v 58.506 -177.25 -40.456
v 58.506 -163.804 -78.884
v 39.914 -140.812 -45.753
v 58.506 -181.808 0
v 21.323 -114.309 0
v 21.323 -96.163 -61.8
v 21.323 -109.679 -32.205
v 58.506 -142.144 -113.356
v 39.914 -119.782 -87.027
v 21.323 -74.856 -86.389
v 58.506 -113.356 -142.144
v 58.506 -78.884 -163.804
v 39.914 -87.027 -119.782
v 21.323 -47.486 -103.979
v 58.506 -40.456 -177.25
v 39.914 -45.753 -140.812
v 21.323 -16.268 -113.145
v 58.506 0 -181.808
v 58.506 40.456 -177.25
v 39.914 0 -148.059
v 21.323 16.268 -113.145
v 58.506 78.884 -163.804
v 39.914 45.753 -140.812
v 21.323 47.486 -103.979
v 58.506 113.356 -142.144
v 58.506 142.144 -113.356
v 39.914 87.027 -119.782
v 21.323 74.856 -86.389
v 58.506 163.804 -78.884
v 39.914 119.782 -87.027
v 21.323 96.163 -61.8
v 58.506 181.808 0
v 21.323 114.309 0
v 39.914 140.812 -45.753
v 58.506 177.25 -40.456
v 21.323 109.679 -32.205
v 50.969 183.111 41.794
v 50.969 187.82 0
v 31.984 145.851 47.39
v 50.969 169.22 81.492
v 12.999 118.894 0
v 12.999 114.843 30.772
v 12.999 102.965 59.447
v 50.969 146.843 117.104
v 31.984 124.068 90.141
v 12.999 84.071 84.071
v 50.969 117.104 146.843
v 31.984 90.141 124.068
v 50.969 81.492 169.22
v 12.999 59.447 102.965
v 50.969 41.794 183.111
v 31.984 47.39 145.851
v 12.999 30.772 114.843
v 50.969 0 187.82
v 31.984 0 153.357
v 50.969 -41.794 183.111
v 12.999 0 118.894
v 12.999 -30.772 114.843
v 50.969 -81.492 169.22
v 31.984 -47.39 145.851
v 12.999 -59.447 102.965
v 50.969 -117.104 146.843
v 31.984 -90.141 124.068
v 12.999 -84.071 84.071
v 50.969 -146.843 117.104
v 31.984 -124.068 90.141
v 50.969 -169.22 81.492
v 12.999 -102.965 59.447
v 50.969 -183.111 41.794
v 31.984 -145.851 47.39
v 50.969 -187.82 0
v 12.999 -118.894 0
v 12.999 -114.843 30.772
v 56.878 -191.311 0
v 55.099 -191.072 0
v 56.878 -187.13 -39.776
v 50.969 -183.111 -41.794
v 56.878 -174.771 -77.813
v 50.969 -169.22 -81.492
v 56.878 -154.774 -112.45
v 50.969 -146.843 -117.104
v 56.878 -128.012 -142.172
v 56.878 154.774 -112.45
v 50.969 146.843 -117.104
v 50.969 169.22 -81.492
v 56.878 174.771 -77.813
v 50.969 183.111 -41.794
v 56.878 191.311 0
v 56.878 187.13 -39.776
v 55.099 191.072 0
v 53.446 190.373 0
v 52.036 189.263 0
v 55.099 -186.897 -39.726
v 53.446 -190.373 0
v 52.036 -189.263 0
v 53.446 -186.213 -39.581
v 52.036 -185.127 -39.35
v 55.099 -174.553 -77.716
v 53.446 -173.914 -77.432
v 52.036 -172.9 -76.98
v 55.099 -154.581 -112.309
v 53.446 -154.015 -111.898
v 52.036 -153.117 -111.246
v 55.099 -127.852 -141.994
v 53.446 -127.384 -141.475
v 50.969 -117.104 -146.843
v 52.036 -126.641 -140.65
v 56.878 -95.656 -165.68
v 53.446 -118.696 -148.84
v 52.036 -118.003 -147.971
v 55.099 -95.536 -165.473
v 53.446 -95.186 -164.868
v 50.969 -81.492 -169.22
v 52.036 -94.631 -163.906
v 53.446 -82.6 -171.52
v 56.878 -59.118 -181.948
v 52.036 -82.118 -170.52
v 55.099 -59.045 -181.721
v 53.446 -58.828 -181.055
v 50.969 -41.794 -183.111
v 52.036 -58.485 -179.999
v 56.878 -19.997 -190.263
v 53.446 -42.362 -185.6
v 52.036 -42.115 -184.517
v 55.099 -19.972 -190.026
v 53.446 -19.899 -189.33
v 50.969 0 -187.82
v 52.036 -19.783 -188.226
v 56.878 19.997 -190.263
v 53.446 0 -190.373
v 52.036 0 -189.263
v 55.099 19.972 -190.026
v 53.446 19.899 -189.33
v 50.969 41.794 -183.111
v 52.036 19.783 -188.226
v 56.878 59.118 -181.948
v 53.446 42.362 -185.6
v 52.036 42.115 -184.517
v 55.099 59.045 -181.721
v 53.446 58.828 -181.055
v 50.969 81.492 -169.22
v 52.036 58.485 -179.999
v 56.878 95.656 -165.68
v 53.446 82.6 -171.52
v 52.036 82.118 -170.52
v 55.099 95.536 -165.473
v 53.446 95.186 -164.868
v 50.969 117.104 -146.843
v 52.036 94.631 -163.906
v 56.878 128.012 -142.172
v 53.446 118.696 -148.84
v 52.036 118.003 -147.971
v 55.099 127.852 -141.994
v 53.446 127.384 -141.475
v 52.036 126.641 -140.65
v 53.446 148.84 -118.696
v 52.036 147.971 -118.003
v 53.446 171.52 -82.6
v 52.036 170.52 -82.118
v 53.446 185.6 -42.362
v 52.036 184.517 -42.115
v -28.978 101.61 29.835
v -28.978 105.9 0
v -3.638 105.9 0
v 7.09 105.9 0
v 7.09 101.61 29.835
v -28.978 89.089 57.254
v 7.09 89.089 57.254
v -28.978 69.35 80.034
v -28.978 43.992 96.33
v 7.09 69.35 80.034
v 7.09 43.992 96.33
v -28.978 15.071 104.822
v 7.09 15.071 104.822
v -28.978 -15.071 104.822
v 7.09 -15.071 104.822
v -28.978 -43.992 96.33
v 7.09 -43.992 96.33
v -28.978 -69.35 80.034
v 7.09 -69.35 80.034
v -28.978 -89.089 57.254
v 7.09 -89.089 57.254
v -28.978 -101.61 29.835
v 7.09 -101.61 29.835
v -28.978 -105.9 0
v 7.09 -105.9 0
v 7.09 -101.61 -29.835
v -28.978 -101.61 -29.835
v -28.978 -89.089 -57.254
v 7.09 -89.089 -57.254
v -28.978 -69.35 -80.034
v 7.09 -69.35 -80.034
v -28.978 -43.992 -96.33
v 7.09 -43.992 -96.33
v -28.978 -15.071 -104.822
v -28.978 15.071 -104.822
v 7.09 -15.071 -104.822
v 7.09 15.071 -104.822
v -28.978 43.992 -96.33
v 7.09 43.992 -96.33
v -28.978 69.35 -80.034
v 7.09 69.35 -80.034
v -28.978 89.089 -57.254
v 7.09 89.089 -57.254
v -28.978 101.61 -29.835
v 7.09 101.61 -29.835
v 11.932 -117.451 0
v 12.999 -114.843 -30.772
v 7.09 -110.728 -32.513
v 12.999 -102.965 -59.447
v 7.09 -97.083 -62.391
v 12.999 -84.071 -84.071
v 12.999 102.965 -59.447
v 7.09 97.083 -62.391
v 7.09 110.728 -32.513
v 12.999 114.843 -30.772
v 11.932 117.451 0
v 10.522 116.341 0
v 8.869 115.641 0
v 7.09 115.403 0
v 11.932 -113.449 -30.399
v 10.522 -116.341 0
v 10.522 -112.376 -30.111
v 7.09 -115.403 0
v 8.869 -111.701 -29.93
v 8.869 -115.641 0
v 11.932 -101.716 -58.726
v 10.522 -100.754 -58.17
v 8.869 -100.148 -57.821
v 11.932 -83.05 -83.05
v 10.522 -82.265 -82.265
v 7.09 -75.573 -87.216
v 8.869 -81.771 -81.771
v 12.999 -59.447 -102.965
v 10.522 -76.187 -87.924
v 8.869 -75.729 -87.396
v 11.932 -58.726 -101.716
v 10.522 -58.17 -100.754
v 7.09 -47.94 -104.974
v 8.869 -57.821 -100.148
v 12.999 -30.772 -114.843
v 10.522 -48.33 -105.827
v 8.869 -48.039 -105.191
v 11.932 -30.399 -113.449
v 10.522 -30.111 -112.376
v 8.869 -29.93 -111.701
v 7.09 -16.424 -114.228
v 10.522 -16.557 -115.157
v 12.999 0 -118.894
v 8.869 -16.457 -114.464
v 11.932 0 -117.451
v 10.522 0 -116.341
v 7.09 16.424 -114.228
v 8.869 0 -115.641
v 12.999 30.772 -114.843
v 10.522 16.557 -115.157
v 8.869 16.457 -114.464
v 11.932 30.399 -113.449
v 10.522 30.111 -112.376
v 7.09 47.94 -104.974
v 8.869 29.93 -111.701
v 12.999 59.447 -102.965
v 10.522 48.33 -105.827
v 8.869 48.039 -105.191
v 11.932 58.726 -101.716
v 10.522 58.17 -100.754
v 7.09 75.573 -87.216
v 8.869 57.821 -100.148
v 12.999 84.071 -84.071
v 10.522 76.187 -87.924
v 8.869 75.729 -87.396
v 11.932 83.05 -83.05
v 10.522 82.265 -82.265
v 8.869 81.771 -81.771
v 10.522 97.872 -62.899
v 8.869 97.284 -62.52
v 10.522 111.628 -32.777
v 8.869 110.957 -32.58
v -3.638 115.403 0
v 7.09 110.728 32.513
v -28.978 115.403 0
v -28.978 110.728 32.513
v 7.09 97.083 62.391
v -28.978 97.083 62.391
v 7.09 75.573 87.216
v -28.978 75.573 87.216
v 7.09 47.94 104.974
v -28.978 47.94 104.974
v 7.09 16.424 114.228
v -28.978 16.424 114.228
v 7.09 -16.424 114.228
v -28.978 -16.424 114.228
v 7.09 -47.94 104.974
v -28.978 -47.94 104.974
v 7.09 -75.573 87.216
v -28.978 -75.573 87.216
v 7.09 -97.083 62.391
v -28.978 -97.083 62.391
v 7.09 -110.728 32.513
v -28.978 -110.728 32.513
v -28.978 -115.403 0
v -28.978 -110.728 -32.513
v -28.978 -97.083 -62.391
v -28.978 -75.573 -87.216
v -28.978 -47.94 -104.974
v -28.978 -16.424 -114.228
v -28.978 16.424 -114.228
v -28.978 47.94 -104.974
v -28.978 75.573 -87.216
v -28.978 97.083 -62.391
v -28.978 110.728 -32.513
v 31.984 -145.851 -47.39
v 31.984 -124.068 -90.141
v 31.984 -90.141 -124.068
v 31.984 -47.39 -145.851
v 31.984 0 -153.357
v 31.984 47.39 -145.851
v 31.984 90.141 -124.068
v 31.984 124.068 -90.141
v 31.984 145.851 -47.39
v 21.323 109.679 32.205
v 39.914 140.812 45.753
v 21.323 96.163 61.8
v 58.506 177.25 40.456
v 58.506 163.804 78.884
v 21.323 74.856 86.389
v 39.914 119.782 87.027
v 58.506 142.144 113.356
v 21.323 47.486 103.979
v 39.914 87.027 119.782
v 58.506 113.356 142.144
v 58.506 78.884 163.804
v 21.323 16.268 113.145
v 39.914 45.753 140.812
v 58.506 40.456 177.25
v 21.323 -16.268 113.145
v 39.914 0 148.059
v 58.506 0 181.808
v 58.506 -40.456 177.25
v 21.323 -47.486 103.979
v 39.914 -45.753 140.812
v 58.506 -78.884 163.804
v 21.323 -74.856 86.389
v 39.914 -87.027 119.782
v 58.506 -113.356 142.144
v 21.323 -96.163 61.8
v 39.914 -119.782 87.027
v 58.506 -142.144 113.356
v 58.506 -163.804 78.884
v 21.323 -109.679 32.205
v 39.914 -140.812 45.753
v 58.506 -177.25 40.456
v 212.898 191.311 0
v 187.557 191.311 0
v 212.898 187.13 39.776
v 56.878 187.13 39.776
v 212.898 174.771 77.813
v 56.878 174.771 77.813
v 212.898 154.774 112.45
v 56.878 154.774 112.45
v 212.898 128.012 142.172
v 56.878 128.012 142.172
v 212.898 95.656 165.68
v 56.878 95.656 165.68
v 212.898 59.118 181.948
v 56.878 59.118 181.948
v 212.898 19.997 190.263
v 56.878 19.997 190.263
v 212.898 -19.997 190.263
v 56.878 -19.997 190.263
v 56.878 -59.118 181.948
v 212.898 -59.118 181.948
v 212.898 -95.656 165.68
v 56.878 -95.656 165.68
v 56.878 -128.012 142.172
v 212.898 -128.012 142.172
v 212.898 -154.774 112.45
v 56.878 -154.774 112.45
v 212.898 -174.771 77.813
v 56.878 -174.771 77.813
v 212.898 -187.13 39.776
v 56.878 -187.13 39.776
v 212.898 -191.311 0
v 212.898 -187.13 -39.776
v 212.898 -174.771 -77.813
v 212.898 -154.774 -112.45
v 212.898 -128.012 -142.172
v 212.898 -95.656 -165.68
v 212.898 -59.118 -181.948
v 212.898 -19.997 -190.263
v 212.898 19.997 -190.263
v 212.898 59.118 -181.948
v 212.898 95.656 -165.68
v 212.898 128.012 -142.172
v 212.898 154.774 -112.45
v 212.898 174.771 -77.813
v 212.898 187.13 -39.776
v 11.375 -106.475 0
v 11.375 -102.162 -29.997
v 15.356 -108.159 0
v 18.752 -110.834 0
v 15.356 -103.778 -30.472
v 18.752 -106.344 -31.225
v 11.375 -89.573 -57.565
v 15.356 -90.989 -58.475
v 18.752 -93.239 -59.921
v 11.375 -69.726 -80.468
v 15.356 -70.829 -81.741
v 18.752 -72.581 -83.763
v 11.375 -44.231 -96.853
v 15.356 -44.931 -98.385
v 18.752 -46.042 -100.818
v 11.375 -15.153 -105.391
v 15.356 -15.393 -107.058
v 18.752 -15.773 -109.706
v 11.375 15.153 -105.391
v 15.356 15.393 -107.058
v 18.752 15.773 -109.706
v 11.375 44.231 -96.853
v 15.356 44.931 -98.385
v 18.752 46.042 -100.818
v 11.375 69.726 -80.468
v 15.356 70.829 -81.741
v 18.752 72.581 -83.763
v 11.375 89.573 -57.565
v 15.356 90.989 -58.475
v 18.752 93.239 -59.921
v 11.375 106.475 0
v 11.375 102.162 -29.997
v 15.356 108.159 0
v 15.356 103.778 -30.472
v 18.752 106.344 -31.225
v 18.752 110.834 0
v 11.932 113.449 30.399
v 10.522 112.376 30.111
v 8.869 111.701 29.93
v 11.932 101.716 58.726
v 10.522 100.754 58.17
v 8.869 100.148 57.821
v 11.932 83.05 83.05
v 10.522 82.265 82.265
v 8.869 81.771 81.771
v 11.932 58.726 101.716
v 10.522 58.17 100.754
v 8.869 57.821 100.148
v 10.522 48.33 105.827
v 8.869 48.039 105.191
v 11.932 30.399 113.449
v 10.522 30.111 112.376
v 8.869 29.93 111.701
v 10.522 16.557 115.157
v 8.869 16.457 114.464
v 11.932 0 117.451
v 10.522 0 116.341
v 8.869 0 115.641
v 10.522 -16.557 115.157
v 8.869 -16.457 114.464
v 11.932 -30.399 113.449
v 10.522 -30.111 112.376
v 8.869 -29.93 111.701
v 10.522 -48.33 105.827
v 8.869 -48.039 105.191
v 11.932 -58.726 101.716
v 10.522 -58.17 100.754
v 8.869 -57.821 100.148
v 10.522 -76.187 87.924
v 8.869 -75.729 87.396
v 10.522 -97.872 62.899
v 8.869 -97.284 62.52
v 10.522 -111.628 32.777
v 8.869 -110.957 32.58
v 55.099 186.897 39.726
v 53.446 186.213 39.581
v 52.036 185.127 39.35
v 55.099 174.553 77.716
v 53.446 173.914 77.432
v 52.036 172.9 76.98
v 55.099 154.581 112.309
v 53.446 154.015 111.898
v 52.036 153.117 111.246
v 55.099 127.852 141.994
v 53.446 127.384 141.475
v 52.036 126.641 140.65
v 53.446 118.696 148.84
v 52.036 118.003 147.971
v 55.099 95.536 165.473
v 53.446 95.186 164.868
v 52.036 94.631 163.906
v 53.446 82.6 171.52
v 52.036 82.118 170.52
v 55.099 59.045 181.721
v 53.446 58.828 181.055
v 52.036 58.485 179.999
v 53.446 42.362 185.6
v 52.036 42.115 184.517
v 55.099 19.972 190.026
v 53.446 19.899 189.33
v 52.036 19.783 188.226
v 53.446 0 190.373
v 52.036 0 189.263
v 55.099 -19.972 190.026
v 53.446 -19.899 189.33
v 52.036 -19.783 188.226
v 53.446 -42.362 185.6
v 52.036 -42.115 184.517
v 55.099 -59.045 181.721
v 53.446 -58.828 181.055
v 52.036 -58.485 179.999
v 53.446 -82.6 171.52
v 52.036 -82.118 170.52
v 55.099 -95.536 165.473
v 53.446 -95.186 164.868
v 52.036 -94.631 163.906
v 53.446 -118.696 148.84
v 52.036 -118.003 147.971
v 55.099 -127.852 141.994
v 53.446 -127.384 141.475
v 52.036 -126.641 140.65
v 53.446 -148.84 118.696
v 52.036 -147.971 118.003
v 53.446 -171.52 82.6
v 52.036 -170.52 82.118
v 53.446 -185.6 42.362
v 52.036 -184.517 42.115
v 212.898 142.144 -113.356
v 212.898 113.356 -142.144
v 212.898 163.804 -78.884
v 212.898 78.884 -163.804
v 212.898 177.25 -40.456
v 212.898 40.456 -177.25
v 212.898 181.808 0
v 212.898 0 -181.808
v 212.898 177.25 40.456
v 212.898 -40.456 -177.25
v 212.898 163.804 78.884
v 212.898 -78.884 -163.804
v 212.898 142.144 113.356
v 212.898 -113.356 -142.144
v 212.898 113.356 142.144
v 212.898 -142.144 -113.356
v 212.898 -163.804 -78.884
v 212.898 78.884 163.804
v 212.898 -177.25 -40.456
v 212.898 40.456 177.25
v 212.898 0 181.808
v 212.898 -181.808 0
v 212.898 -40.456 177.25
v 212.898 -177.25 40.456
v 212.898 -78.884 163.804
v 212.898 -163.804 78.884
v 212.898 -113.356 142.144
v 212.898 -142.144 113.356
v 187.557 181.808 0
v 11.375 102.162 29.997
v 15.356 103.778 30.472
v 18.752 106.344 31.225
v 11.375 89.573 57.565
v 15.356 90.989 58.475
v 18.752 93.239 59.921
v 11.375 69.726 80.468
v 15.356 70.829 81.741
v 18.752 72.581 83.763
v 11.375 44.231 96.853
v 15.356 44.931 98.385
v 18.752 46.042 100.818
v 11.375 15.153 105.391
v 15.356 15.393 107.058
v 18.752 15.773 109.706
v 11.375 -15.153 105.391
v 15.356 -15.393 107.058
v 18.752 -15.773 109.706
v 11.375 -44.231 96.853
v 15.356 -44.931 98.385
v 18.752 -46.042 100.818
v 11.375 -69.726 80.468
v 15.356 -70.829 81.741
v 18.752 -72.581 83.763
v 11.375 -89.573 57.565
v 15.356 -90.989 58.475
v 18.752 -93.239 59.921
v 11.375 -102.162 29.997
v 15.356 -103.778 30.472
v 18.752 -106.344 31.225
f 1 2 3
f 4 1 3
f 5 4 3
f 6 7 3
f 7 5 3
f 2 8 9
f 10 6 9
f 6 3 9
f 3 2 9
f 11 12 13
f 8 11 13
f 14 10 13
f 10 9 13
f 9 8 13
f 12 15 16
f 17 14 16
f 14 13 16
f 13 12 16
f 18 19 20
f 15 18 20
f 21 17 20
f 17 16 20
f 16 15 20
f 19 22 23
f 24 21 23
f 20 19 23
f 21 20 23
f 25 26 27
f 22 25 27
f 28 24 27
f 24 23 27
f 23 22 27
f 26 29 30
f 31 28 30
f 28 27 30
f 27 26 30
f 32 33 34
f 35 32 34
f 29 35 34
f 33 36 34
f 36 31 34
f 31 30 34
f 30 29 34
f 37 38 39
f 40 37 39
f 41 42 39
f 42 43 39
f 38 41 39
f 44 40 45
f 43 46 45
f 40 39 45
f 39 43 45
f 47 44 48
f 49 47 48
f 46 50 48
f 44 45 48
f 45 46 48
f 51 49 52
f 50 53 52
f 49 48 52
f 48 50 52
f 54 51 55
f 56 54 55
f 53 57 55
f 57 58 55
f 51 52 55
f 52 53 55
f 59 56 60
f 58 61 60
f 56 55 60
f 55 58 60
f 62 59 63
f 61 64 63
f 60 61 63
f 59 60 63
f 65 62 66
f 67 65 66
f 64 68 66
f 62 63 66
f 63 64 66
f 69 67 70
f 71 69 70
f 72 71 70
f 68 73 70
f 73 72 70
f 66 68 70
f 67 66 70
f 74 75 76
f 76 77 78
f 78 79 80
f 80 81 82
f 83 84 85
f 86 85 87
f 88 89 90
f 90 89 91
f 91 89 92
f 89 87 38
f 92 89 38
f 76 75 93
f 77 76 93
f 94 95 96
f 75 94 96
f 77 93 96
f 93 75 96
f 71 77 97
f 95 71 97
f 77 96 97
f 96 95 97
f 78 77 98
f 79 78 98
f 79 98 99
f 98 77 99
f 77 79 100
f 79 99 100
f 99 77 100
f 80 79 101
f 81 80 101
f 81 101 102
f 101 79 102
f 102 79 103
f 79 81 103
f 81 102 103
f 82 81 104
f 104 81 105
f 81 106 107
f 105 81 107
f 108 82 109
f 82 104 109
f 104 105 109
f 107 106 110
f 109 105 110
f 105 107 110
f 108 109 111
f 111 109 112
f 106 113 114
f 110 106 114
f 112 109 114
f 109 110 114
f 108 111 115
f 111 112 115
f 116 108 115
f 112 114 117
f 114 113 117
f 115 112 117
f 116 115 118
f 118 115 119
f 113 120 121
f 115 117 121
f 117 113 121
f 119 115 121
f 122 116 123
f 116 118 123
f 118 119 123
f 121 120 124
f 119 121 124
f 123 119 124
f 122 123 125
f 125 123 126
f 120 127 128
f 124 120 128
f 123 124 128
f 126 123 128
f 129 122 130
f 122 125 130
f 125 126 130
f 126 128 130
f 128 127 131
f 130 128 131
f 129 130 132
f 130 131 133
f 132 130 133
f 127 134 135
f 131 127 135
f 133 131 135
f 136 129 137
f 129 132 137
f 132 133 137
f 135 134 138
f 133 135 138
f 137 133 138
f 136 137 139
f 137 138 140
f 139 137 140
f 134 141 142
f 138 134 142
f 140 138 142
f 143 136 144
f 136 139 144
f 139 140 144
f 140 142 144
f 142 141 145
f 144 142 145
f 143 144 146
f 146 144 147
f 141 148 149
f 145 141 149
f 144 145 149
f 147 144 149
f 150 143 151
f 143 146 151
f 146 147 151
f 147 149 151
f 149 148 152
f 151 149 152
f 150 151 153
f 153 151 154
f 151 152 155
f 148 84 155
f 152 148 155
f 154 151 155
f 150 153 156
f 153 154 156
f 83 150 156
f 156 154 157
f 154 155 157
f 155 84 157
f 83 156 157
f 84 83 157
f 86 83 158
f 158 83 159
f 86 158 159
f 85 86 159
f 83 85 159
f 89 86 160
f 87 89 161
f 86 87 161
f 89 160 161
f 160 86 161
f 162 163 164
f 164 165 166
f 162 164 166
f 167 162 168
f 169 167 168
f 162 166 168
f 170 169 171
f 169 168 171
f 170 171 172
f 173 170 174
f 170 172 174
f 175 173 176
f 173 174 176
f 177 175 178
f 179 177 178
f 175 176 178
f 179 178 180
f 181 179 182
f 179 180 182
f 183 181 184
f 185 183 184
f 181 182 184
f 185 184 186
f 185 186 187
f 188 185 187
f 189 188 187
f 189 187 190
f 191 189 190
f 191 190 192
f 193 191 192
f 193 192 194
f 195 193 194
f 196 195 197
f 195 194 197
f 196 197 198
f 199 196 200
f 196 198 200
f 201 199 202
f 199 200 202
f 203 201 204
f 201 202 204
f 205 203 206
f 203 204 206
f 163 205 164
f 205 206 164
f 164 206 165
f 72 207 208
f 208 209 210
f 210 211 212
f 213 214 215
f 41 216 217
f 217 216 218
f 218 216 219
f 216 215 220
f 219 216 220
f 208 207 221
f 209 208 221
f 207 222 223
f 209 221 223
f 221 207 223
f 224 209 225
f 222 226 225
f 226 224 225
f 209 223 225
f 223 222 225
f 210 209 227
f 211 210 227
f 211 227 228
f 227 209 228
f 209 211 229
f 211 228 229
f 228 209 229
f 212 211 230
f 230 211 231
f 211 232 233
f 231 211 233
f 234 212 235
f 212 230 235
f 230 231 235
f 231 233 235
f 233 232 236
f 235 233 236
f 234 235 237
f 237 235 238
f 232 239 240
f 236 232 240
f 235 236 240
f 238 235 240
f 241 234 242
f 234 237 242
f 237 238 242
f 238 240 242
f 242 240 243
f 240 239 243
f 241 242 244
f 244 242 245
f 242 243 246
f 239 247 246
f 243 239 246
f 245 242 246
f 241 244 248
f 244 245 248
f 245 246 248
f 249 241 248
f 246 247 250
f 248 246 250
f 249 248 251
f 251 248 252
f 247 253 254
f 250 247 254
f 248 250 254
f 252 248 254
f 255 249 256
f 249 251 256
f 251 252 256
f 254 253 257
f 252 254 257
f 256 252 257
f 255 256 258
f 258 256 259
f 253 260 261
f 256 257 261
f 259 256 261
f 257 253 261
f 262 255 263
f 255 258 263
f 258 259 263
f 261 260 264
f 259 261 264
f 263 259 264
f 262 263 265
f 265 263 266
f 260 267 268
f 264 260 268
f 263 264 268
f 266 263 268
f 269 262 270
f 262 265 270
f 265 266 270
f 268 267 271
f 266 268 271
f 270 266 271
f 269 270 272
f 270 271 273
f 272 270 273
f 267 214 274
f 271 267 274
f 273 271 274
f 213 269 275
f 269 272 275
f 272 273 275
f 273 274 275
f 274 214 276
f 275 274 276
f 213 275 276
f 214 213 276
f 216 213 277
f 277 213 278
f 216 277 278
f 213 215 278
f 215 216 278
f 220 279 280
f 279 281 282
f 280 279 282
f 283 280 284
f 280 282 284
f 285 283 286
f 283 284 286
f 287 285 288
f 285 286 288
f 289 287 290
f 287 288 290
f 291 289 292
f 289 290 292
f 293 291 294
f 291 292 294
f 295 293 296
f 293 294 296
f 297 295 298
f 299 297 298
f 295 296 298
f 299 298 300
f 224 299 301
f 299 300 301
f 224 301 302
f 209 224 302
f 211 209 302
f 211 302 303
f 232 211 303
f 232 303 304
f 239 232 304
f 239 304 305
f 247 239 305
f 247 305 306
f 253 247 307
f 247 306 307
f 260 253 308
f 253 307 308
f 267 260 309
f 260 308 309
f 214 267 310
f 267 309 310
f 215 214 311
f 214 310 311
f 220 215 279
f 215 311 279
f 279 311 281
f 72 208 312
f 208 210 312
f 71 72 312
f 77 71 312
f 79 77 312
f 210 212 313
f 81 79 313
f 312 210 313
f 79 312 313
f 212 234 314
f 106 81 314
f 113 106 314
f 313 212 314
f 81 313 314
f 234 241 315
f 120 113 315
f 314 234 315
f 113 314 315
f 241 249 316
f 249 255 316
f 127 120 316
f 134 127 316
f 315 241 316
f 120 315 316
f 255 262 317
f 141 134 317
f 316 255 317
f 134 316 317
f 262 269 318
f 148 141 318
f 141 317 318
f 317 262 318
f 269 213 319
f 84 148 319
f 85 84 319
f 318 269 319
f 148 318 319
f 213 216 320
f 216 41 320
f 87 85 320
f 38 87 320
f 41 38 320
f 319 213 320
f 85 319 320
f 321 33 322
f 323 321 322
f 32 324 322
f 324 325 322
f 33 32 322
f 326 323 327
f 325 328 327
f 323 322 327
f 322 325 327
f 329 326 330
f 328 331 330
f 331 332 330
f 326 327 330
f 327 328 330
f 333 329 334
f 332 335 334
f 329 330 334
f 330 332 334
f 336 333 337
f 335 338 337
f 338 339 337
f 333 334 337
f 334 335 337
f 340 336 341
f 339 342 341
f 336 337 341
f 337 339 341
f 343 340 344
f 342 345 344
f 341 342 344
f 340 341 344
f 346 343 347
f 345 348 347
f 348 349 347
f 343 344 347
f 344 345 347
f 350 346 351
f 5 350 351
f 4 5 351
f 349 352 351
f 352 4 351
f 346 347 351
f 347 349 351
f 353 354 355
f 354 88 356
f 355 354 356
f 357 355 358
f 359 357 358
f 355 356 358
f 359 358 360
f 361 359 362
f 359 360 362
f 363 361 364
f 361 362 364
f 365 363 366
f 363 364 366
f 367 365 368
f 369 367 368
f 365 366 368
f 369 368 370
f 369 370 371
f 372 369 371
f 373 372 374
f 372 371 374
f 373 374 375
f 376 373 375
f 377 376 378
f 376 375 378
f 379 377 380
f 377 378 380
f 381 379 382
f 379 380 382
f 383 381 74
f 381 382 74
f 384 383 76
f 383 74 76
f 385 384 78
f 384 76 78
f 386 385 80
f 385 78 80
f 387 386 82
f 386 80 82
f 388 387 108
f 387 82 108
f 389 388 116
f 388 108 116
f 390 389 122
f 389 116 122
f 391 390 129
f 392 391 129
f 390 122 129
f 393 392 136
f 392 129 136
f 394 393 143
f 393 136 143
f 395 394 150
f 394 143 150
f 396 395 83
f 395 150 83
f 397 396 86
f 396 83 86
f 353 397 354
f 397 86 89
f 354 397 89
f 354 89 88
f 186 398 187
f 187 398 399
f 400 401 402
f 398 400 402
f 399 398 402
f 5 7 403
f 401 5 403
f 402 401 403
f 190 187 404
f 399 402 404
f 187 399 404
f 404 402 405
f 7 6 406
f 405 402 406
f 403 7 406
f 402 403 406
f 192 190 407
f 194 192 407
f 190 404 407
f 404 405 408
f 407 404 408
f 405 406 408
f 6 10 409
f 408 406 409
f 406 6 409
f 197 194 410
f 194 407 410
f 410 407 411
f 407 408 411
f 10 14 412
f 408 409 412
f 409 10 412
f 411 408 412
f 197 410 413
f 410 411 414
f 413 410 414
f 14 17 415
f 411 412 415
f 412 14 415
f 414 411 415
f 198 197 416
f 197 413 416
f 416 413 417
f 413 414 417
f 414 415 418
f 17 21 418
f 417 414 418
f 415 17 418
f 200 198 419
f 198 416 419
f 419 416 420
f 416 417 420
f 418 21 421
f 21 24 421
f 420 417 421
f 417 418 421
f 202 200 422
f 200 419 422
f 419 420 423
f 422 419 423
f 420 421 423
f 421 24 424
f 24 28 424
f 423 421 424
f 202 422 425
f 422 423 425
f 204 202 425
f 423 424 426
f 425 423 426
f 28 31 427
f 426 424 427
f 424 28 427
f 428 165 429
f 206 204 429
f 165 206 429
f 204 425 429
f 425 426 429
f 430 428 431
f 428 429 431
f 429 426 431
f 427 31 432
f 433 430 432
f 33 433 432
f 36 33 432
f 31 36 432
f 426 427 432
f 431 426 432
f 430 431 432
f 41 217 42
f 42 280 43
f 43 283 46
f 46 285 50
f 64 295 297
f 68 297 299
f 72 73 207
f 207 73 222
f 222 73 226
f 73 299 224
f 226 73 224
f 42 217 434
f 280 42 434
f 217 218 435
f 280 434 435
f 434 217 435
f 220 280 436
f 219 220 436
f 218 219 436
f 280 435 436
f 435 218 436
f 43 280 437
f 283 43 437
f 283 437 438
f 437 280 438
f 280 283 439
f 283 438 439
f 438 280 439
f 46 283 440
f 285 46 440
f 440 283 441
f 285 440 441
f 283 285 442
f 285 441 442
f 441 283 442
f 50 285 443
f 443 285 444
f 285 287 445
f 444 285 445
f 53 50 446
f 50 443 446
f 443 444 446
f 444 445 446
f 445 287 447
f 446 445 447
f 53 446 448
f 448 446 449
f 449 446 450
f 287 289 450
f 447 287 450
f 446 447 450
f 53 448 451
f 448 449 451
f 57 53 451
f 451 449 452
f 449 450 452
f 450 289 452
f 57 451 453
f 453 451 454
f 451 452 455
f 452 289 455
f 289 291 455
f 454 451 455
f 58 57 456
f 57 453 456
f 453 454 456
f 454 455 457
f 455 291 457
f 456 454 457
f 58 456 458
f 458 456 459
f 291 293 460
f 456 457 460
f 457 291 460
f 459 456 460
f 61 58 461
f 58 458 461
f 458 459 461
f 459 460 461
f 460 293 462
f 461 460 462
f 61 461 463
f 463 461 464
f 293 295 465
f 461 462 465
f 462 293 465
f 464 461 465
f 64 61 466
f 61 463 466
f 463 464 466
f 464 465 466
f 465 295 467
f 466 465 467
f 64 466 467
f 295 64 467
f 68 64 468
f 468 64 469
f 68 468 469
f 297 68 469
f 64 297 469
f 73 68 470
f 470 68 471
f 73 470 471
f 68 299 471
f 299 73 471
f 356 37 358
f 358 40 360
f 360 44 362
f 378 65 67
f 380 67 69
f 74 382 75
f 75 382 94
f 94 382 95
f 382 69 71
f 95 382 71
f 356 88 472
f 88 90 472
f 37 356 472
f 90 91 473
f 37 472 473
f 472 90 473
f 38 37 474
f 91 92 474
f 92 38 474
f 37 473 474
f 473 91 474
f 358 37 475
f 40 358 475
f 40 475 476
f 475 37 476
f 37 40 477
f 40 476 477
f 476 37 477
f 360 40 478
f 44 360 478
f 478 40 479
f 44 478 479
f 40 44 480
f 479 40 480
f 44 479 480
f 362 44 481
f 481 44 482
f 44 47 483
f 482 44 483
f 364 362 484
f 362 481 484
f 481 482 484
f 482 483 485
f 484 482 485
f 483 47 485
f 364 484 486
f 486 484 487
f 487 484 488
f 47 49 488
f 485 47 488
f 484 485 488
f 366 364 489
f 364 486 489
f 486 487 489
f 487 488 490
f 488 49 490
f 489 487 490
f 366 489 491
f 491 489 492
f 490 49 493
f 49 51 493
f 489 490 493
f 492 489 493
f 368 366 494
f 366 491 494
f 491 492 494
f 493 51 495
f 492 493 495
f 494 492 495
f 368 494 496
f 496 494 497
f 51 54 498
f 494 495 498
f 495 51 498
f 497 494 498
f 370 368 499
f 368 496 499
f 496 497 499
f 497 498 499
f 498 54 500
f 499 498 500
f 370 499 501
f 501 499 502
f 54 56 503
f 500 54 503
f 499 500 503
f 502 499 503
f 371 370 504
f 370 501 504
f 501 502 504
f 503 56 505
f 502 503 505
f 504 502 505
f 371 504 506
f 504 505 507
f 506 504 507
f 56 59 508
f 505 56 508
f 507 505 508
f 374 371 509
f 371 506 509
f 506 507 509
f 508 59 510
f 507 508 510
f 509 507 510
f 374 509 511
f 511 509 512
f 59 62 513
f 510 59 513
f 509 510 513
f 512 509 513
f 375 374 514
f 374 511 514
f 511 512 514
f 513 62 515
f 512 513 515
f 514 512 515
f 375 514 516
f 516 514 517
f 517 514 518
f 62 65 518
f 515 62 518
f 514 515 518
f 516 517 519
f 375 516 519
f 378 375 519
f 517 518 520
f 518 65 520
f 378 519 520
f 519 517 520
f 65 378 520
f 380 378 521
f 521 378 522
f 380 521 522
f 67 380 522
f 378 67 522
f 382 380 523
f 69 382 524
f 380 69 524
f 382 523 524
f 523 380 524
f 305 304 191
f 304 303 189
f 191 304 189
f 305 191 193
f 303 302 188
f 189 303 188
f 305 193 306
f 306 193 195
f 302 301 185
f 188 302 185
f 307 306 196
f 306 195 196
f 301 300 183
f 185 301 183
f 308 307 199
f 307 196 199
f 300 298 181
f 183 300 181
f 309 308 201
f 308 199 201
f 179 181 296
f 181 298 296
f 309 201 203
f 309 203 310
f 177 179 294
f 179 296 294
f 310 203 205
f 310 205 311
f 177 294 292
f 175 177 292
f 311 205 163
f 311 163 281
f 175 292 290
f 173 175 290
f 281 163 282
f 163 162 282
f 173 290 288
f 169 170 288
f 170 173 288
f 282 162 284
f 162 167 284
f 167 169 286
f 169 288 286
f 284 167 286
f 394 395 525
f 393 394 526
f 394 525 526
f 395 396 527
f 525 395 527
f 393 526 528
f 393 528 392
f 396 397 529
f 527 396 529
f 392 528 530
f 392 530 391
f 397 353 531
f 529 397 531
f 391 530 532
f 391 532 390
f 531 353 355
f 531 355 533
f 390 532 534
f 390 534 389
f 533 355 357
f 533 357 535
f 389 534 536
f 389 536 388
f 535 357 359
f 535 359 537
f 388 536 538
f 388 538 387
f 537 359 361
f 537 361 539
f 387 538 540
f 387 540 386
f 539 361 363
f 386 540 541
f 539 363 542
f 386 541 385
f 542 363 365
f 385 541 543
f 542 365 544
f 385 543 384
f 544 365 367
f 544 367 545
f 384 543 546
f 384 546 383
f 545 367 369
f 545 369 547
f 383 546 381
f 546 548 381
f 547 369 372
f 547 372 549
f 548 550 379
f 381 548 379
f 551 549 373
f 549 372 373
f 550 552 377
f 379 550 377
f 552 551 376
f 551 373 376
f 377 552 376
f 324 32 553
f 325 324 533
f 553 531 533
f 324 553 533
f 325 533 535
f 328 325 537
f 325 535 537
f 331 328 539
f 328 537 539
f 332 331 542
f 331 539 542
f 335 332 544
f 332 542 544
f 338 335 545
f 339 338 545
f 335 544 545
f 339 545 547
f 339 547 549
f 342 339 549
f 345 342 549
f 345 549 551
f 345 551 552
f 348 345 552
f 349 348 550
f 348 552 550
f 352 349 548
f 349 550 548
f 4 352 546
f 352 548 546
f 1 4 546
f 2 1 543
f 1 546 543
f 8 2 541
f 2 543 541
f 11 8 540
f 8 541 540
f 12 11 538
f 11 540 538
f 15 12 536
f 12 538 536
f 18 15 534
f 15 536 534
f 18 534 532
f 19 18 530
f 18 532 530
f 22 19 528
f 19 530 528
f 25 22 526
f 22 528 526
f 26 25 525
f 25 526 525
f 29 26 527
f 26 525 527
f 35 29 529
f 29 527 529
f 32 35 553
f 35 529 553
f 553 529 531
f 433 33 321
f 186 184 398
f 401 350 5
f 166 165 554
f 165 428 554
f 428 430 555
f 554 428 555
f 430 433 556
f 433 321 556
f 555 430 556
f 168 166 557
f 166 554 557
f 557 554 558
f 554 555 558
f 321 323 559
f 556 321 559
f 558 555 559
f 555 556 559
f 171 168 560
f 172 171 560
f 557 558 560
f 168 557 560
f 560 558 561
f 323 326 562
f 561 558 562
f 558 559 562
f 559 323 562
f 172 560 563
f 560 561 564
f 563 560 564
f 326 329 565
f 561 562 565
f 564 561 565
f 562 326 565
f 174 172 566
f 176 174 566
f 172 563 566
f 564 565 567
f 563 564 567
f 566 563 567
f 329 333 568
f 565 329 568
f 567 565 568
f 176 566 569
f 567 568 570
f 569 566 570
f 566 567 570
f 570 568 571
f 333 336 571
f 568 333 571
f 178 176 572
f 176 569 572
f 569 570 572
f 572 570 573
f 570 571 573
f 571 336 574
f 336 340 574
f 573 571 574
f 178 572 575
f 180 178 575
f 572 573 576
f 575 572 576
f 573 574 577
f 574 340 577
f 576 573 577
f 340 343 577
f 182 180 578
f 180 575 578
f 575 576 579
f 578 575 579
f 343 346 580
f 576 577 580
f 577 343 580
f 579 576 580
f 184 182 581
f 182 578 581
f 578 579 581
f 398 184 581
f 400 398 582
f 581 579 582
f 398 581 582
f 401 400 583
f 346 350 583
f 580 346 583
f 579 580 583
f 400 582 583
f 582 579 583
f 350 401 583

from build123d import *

# Parameters (mm, degrees)
SKETCH81_W          = 180
SKETCH81_H          = 433.466768404
EXTRUDE1_DEPTH      = 189
EXTRUDE1_DEPTH_BACK = 4.64655855
BOSS_EXTRUDE1_DEPTH = 25.4
BOSS_EXTRUDE2_DEPTH = 25.4
SCALE1_SCALE        = 0.99764556
SKETCH86_W          = 340
SKETCH86_H          = 440
CUT_EXTRUDE3_DEPTH  = 25.841374544
REVOLVE1_ANGLE      = 180


with BuildPart() as part:
    # Sketch1 → Revolve-Thin1 (revolve)
    with BuildSketch(Plane.XY, mode=Mode.PRIVATE) as revolve_thin1_sk:
        with BuildLine():
            Line((188, 191.7625), (57.01221252, 191.7625))
            ThreePointArc((57.01221252, 191.7625), (53.572316909, 190.822243935), (51.088985501, 188.262941607))
            Line((51.088985501, 188.262941607), (13.030109919, 119.174558393))
            ThreePointArc((13.030109919, 119.174558393), (10.546778511, 116.615256065), (7.1068829, 115.675))
            Line((7.1068829, 115.675), (-3.64655855, 115.675))
            Line((-3.64655855, 115.675), (-3.64655855, 106.15))
            Line((-3.64655855, 106.15), (7.1068829, 106.15))
            ThreePointArc((7.1068829, 106.15), (15.391881017, 108.41460934), (21.372991598, 114.578696092))
            Line((21.372991598, 114.578696092), (58.64435156, 182.2375))
            Line((58.64435156, 182.2375), (188, 182.2375))
            Line((188, 182.2375), (188, 191.7625))
        make_face()
    revolve(revolve_thin1_sk.sketch.rotate(Axis((0, 0, 0), (1, 0, 0)), 270), axis=Axis((0, 0, 0), (1, 0, 0)))  # turned: the seam where the file's is

    # Sketch81 → Extrude1 (cut, two sides)
    with BuildSketch(Plane(origin=(0, 0, 0), x_dir=(0, 0, -1), z_dir=(1, 0, 0))) as extrude1_sk:
        with Locations((-114.9, 1.572115024)):
            Rectangle(SKETCH81_W, SKETCH81_H)
    extrude(amount=EXTRUDE1_DEPTH, mode=Mode.SUBTRACT)
    extrude(extrude1_sk.sketch, amount=-EXTRUDE1_DEPTH_BACK, mode=Mode.SUBTRACT)

    # Sketch82 → Boss-Extrude1 (add)
    with BuildSketch(Plane.ZY.offset(3.64655855)):
        with BuildLine():
            Line((24.9, 103.188238186), (24.9, 112.963249002))
            ThreePointArc((24.9, 112.963249002), (-115.675, 0), (24.9, -112.963249002))
            Line((24.9, -112.963249002), (24.9, -103.188238186))
            ThreePointArc((24.9, -103.188238186), (-106.15, 0), (24.9, 103.188238186))
        make_face()
    extrude(amount=BOSS_EXTRUDE1_DEPTH)

    # Sketch83 → Boss-Extrude2 (add)
    with BuildSketch(Plane(origin=(188, 0, 0), x_dir=(0, 0, -1), z_dir=(1, 0, 0))):
        with BuildLine():
            Line((-24.9, -180.528381166), (-24.9, -190.139018632))
            ThreePointArc((-24.9, -190.139018632), (191.7625, 0), (-24.9, 190.139018632))
            Line((-24.9, 190.139018632), (-24.9, 180.528381166))
            ThreePointArc((-24.9, 180.528381166), (182.2375, 0), (-24.9, -180.528381166))
        make_face()
    extrude(amount=BOSS_EXTRUDE2_DEPTH)


with BuildPart() as part_1:
    # Scale1: scaled about (0, 0, 0)
    add(part.part.scale(SCALE1_SCALE))

    # Sketch86 → Cut-Extrude3 (cut, through all)
    with BuildSketch(Plane.XY):
        with Locations((100, 0)):
            Rectangle(SKETCH86_W, SKETCH86_H)
    extrude(amount=CUT_EXTRUDE3_DEPTH, mode=Mode.SUBTRACT)

    # Sketch87 → Revolve1 (revolve)
    with BuildSketch(Plane.XY):
        with BuildLine():
            Line((58.506276953, 181.808432741), (212.897562504, 181.808432741))
            Line((212.897562504, 181.808432741), (212.897562504, 191.3110067))
            Line((212.897562504, 191.3110067), (56.877980686, 191.3110067))
            ThreePointArc((56.877980686, 191.3110067), (53.446184103, 190.372964411), (50.96869955, 187.819687807))
            Line((50.96869955, 187.819687807), (12.999431307, 118.893969046))
            ThreePointArc((12.999431307, 118.893969046), (10.521946754, 116.340692442), (7.090150171, 115.402650153))
            Line((7.090150171, 115.402650153), (-28.978170171, 115.402650153))
            Line((-28.978170171, 115.402650153), (-28.978170171, 105.900076194))
            Line((-28.978170171, 105.900076194), (7.090150171, 105.900076194))
            ThreePointArc((7.090150171, 105.900076194), (15.355641757, 108.159353648), (21.322670172, 114.308927427))
            Line((21.322670172, 114.308927427), (58.506276953, 181.808432741))
        make_face()
    revolve(axis=Axis((224.991349138, 0, 0), (1, 0, 0)), revolution_arc=REVOLVE1_ANGLE)


solid = part_1.part
